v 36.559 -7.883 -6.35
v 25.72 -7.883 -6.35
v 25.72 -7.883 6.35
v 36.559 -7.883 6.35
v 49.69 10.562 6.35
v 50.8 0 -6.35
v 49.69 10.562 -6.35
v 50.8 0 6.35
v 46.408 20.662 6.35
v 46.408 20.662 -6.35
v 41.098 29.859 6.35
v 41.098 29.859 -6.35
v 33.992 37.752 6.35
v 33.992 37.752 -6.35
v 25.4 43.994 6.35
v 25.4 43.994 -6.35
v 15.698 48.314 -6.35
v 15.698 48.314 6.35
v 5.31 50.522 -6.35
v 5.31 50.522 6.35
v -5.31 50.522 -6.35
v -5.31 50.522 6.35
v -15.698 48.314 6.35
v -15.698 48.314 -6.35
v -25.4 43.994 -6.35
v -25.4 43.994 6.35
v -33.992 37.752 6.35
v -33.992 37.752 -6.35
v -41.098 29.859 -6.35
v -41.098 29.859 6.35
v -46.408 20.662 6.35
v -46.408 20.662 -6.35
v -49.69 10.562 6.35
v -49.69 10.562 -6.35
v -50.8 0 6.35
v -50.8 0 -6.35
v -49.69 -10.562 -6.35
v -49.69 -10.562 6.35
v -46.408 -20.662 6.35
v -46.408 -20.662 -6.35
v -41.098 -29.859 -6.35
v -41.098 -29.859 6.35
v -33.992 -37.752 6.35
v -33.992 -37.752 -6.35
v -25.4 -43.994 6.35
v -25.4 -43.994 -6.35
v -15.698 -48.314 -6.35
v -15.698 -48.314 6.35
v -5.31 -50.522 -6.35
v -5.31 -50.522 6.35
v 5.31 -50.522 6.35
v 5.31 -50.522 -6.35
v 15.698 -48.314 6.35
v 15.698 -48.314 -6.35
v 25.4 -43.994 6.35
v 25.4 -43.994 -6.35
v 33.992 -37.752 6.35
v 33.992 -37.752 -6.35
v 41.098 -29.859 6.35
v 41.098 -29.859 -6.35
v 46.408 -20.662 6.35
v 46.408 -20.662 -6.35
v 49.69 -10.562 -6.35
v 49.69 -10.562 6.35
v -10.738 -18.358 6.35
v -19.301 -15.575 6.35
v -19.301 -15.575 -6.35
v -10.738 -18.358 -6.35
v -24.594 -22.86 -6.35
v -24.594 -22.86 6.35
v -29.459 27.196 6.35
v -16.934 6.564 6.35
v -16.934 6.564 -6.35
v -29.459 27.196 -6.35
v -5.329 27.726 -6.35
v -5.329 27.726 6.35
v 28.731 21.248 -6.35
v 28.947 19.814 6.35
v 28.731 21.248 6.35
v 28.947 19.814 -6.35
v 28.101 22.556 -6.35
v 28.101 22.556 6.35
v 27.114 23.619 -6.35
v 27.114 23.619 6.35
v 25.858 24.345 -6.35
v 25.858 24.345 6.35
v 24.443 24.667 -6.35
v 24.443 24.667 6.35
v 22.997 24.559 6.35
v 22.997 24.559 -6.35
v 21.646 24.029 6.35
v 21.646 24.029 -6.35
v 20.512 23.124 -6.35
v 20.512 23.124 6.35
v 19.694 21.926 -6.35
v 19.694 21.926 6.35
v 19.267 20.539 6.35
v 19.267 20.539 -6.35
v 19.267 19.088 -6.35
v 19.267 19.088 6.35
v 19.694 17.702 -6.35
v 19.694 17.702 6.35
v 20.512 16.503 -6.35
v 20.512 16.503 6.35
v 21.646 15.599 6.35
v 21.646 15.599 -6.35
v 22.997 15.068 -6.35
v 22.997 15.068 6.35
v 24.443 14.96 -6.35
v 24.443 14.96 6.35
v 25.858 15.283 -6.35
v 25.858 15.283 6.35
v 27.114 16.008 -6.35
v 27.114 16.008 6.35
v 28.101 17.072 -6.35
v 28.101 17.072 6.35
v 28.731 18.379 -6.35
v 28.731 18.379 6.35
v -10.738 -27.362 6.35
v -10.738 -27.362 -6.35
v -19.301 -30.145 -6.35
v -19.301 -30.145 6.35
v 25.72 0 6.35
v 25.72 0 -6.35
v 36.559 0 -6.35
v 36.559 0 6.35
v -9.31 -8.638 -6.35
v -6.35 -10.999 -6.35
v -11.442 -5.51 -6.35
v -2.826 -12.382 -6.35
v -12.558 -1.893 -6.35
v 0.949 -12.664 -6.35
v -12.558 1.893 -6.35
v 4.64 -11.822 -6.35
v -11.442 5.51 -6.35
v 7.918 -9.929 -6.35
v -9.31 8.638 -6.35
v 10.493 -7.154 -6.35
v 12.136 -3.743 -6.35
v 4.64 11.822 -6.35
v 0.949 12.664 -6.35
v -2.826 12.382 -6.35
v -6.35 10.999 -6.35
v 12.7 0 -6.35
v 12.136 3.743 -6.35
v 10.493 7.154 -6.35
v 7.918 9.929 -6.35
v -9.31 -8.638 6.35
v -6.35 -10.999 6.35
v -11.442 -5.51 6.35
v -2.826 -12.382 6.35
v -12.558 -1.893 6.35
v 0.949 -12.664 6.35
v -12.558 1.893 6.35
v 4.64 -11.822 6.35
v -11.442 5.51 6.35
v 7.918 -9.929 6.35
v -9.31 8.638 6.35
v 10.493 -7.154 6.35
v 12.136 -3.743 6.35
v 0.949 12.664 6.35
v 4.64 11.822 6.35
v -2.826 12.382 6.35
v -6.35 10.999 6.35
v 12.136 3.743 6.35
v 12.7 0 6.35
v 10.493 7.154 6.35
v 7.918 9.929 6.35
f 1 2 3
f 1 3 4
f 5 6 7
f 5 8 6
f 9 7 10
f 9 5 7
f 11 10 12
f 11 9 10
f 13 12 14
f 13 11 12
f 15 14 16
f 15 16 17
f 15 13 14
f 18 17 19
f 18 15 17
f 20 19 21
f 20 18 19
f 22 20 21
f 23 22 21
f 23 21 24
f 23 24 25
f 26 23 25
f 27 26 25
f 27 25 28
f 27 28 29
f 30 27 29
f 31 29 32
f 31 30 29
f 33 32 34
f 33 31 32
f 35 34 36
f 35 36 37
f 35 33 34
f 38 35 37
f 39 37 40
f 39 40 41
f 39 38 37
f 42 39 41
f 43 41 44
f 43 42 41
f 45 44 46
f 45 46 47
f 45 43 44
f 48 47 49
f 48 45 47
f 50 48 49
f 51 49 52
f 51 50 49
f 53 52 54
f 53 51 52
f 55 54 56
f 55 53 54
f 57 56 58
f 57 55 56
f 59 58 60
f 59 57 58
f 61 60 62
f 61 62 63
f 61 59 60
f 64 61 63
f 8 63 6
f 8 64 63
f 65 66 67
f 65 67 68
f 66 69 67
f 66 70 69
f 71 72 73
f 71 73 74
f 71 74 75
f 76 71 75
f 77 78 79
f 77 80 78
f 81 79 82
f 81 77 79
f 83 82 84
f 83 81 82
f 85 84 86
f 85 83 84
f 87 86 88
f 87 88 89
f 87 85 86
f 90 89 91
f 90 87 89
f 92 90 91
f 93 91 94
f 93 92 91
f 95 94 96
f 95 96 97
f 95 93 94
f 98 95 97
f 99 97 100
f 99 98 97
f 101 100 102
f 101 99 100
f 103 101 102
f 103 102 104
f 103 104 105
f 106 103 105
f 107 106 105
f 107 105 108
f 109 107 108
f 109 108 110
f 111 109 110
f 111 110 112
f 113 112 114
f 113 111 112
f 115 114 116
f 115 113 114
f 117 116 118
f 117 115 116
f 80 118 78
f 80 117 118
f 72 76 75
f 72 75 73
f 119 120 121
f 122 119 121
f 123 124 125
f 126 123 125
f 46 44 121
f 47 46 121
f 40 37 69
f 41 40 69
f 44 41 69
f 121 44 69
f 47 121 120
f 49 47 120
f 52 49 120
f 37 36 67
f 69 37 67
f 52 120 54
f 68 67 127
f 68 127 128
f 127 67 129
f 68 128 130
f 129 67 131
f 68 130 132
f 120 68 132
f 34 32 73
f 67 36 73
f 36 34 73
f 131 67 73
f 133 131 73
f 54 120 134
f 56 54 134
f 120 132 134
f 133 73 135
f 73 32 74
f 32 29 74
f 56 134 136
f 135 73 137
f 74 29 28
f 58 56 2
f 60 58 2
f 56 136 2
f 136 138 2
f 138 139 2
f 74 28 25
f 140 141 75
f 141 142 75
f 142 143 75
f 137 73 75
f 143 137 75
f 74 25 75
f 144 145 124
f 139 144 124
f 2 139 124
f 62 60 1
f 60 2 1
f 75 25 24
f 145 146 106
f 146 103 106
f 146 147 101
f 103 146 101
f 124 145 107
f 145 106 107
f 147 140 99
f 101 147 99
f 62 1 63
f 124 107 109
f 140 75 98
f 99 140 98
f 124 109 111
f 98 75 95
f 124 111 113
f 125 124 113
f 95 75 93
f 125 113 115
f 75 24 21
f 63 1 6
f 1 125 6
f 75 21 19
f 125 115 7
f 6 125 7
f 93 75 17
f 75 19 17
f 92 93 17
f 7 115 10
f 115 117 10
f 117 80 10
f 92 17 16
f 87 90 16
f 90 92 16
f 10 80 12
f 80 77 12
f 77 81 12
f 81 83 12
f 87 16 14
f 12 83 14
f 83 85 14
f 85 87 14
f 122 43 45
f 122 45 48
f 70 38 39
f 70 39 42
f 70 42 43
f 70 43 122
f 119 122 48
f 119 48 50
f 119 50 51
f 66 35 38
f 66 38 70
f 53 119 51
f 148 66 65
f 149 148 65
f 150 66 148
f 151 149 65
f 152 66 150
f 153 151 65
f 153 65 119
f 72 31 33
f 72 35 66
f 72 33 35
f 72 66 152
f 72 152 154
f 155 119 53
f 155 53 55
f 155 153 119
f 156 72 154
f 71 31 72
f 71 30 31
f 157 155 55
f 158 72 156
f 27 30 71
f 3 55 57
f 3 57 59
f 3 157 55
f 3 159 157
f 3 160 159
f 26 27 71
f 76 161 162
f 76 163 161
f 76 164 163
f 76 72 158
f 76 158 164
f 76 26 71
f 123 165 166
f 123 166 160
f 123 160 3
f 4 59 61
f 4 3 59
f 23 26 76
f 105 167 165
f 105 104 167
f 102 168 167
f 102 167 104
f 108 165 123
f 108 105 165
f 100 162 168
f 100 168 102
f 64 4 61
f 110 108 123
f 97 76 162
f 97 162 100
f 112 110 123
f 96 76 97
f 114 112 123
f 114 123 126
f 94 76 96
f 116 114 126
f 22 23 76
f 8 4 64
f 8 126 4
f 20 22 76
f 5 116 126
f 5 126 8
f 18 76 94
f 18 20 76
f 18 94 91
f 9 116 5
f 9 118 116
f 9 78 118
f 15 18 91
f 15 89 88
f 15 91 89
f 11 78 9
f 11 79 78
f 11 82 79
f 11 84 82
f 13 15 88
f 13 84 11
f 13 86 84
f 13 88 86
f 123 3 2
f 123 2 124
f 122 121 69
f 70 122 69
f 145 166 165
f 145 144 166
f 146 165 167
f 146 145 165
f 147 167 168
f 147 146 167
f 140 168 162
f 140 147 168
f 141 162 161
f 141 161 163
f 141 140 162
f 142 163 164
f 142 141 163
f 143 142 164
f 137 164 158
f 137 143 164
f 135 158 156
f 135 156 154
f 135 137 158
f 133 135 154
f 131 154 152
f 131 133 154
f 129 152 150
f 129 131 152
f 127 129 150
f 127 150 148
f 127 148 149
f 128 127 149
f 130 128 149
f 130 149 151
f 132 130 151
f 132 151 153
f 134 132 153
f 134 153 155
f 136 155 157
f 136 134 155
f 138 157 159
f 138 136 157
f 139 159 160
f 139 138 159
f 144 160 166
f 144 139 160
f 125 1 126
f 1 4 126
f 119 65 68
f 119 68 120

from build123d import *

# Parameters (mm, degrees)
F0_R     = 50.8
F0_R_2   = 12.7
F0_W     = 10.838795
F0_H     = 7.882758
F0_R_3   = 4.867285
F1_DEPTH = 6.35


with BuildPart() as f1:
    # F0 (on Top) → F1 (new body, symmetric)
    with BuildSketch(Plane.XY):
        Circle(F0_R)
        Polygon((-19.301308, -15.575219), (-10.737533, -18.357759), (-10.737533, -27.362245), (-19.301308, -30.144784), (-24.594012, -22.860002), align=None, mode=Mode.SUBTRACT)
        Circle(F0_R_2, mode=Mode.SUBTRACT)
        with Locations((31.139625, -3.941379)):
            Rectangle(F0_W, F0_H, mode=Mode.SUBTRACT)
        Polygon((-29.459082, 27.195517), (-5.329002, 27.726336), (-16.934339, 6.563665), align=None, mode=Mode.SUBTRACT)
        with Locations((24.079654, 19.813703)):
            Circle(F0_R_3, mode=Mode.SUBTRACT)
    extrude(amount=F1_DEPTH, both=True)


solid = f1.part
